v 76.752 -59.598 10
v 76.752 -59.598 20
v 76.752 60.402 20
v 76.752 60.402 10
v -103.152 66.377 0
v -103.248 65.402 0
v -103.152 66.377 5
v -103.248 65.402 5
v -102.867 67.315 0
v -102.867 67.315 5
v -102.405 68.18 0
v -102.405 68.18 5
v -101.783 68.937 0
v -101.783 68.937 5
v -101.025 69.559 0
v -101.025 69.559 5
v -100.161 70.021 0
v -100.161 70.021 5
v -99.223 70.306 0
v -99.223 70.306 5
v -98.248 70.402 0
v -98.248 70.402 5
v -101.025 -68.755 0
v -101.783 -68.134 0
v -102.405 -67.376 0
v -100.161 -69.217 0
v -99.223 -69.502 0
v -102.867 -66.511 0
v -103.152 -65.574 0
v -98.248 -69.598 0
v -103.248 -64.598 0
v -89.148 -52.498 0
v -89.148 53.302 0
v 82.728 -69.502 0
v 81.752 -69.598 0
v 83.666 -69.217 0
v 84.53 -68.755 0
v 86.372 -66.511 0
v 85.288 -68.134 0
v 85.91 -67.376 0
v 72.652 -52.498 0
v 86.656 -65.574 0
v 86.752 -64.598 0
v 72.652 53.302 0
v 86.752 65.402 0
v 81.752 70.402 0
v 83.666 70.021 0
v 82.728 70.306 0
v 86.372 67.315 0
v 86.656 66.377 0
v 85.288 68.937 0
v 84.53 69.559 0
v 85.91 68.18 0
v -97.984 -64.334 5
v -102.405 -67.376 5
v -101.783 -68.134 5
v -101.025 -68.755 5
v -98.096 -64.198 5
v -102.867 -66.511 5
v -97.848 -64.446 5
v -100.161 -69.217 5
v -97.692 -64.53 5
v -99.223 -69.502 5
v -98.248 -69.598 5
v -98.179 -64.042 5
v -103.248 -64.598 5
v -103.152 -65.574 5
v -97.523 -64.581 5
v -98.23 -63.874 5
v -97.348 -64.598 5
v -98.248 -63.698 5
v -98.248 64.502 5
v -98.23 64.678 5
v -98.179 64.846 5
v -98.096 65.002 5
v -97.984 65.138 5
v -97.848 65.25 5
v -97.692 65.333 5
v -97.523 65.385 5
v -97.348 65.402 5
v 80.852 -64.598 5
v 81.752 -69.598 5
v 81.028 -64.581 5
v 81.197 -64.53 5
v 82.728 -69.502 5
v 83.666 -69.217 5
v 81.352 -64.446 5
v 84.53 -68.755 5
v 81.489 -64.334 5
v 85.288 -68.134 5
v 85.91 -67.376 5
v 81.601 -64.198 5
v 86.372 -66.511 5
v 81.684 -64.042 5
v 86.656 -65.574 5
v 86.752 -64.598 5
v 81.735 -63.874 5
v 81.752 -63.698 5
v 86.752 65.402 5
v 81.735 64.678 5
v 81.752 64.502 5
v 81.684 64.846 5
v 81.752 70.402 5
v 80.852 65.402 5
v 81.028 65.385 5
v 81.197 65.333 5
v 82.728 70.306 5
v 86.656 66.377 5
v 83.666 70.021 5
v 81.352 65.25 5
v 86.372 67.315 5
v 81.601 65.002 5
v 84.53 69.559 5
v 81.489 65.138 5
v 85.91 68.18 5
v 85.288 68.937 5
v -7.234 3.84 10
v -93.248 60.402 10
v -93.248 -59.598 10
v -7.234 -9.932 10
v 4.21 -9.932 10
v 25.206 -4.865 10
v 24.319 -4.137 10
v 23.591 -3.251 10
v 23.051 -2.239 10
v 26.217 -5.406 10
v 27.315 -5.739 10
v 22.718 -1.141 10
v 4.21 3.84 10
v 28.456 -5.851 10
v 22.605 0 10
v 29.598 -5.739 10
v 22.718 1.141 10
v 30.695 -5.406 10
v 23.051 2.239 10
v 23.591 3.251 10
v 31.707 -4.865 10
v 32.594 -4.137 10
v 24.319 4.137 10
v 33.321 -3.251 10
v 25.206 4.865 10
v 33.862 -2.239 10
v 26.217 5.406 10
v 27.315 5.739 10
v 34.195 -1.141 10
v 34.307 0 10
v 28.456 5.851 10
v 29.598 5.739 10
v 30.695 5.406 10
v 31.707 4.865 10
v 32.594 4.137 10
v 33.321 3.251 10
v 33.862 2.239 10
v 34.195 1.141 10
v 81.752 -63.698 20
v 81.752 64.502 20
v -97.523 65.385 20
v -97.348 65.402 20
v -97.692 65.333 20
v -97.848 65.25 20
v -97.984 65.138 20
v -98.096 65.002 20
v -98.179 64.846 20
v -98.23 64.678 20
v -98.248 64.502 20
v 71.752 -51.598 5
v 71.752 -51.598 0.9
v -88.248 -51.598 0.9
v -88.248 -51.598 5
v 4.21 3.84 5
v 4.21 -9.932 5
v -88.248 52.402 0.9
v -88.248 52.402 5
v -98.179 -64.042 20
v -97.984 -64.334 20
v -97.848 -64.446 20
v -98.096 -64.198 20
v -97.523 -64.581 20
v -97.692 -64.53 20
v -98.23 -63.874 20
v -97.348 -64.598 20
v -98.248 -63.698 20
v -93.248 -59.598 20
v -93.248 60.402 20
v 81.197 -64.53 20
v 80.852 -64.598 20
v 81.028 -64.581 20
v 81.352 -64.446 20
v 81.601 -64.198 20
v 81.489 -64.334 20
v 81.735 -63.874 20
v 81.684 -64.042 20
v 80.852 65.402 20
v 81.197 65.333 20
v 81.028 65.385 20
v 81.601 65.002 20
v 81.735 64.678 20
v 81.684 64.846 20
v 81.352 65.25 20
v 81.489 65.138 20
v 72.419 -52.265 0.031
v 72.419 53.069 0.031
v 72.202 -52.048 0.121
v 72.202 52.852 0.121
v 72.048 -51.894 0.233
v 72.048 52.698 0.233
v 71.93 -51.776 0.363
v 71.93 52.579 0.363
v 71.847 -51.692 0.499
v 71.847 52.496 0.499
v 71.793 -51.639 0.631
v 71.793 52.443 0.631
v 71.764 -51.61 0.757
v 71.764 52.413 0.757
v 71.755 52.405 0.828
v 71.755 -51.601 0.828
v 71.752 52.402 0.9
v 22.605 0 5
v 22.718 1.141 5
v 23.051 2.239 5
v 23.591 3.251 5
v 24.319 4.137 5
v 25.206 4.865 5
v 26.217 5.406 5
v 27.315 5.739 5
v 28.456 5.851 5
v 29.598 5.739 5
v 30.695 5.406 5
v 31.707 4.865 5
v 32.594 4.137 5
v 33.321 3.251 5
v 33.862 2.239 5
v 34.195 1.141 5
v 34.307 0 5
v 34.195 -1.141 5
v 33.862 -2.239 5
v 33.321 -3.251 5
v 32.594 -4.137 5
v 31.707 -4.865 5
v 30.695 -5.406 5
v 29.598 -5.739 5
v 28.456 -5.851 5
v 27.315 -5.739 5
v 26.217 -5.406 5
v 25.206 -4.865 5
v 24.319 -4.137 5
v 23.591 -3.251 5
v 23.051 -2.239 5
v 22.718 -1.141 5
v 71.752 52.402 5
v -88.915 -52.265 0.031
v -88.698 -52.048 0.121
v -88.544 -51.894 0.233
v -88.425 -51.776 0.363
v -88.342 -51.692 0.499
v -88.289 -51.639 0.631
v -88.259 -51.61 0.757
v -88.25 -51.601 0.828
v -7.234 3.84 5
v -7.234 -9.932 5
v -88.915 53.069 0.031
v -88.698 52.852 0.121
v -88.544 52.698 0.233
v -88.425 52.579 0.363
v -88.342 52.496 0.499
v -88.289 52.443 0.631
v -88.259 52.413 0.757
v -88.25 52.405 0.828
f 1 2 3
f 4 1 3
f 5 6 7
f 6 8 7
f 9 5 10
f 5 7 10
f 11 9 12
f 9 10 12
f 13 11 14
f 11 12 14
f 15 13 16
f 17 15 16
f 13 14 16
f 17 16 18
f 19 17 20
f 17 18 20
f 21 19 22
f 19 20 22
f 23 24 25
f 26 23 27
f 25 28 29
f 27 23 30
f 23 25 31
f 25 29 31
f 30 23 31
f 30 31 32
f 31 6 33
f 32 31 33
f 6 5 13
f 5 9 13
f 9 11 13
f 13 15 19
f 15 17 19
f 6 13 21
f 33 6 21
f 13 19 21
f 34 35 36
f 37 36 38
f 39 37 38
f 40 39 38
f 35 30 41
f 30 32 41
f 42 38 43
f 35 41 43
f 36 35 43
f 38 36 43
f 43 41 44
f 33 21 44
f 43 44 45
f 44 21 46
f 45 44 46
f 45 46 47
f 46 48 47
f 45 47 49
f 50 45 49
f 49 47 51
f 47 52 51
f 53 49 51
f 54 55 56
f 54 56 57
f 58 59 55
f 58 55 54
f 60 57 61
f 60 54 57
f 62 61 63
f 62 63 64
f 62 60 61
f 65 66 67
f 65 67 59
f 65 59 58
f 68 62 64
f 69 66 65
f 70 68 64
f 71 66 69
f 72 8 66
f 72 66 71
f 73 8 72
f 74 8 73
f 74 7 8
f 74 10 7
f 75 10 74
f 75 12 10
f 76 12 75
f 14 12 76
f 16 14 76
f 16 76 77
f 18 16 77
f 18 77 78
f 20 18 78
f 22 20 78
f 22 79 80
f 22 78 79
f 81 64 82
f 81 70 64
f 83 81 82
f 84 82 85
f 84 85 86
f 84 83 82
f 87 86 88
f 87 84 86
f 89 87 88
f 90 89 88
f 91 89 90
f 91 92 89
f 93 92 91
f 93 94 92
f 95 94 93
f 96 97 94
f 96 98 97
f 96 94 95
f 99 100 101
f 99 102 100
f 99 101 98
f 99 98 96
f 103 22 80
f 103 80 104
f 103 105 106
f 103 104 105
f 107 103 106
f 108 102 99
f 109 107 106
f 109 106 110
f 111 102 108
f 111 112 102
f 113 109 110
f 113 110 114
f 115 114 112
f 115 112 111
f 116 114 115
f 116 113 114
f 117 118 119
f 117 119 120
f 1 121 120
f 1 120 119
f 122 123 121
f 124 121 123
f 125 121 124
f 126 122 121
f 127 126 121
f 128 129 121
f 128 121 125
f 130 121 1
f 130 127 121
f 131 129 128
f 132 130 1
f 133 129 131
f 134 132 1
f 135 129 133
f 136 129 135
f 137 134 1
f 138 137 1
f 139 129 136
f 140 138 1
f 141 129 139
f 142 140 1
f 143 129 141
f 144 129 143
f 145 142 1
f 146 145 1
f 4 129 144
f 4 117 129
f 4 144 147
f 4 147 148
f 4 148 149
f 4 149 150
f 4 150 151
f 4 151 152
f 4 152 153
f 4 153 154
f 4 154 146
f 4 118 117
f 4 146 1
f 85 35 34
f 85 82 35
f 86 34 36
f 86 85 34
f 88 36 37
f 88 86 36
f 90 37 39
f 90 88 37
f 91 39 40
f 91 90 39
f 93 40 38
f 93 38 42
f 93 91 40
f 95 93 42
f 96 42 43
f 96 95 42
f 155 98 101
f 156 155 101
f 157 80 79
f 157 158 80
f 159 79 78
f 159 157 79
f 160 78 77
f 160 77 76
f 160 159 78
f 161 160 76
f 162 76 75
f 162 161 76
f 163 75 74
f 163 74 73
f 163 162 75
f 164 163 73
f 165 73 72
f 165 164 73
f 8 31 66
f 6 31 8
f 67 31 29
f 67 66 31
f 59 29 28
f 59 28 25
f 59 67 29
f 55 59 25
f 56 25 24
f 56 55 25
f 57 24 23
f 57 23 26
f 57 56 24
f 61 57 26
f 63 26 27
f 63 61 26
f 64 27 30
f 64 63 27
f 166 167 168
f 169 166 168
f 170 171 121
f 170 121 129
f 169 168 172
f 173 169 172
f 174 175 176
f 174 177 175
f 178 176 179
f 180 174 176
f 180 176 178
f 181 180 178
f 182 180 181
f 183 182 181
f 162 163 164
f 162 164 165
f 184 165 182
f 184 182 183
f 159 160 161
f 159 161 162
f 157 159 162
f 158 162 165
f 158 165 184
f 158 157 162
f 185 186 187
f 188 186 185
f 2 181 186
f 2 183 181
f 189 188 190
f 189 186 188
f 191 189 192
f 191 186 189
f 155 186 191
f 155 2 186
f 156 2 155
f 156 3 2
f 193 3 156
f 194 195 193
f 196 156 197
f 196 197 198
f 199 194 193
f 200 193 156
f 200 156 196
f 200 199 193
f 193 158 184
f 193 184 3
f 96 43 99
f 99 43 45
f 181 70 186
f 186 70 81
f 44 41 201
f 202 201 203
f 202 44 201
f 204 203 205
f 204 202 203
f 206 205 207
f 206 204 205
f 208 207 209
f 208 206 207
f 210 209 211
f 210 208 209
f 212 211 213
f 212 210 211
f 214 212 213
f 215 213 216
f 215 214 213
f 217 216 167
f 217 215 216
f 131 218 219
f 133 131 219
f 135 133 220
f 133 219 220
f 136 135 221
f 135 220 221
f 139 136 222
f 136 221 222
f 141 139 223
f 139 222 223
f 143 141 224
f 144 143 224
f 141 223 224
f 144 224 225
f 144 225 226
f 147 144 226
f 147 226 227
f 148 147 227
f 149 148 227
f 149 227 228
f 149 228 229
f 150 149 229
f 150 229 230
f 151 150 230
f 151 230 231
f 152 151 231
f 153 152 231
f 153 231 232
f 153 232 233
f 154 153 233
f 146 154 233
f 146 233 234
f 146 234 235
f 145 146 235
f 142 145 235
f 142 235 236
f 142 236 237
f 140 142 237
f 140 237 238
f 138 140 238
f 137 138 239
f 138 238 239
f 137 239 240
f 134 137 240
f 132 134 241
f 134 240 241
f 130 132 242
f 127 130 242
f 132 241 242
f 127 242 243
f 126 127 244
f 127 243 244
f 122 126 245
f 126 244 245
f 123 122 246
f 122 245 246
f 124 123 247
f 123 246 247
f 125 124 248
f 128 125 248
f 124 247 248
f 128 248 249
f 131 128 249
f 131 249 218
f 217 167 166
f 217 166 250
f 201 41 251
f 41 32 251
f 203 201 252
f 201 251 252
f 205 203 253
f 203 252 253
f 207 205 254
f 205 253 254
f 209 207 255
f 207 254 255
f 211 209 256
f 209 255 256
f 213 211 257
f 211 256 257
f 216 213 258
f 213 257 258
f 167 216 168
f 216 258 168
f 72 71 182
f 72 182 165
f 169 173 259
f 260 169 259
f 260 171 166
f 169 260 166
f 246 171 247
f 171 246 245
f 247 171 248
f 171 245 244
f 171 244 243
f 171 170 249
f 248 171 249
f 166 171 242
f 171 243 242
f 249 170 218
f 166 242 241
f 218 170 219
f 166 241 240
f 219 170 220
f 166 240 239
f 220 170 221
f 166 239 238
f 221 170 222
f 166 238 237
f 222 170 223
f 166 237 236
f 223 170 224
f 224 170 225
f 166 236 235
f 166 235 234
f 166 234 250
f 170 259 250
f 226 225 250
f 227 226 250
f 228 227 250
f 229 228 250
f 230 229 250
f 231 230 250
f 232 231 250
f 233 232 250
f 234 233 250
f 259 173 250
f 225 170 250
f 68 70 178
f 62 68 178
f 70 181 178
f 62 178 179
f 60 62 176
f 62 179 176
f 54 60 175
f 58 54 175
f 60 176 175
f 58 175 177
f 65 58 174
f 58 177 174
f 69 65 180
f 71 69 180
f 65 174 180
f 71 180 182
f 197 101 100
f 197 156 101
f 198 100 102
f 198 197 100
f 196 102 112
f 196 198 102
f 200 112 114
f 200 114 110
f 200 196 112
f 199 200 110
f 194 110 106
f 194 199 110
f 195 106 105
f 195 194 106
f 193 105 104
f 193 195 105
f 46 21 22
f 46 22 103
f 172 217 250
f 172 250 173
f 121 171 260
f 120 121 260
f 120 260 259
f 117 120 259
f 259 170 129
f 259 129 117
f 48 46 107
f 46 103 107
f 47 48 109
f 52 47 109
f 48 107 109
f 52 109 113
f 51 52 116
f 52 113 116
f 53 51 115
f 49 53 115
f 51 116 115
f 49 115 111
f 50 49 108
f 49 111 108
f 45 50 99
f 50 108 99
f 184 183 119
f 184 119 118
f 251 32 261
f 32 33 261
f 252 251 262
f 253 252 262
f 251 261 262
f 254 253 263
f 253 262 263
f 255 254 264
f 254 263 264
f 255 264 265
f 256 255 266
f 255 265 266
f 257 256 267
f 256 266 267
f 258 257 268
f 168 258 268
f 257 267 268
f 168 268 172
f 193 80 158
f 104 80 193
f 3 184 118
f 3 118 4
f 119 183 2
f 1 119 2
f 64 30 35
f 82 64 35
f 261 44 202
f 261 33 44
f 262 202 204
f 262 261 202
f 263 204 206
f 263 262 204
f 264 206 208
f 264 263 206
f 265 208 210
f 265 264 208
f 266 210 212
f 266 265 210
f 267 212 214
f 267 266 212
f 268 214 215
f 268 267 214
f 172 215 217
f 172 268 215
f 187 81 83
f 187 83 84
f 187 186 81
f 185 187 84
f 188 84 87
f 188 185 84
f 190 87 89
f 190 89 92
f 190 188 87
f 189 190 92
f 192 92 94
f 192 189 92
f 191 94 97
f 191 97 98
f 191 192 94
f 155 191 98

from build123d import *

# Parameters (mm, degrees)
SKETCH1_W           = 190
SKETCH1_H           = 140
BOSS_EXTRUDE1_DEPTH = 5
SKETCH2_W           = 160
SKETCH2_H           = 104
CUT_EXTRUDE1_DEPTH  = 5
SKETCH3_W           = 180
SKETCH3_H           = 130
BOSS_EXTRUDE2_DEPTH = 15
SKETCH4_W           = 170
SKETCH4_H           = 120
CUT_EXTRUDE2_DEPTH  = 10
FILLET1_R           = 0.9
FILLET2_R           = 0.9
SKETCH5_R           = 5.850988458
SKETCH5_W           = 11.444331631
SKETCH5_H           = 13.771992302
CUT_EXTRUDE3_DEPTH  = 10
FILLET3_R           = 5


with BuildPart() as part:
    # Sketch1 → Boss-Extrude1 (new body)
    with BuildSketch(Plane.XY):
        with Locations((-8.247588424, 0.40192926)):
            Rectangle(SKETCH1_W, SKETCH1_H)
    extrude(amount=BOSS_EXTRUDE1_DEPTH)

    # Sketch2 → Cut-Extrude1 (cut)
    with BuildSketch(Plane(origin=(0, 0, 0), x_dir=(-1, 0, 0), z_dir=(0, 0, -1))):
        with Locations((8.247588424, 0.40192926)):
            Rectangle(SKETCH2_W, SKETCH2_H)
    extrude(amount=-CUT_EXTRUDE1_DEPTH, mode=Mode.SUBTRACT)

    # Sketch3 → Boss-Extrude2 (add)
    with BuildSketch(Plane.XY.offset(5)):
        with Locations((-8.247588424, 0.40192926)):
            Rectangle(SKETCH3_W, SKETCH3_H)
    extrude(amount=BOSS_EXTRUDE2_DEPTH)

    # Sketch4 → Cut-Extrude2 (cut)
    with BuildSketch(Plane.XY.offset(20)):
        with Locations((-8.247588424, 0.40192926)):
            Rectangle(SKETCH4_W, SKETCH4_H)
    extrude(amount=-CUT_EXTRUDE2_DEPTH, mode=Mode.SUBTRACT)

    # Fillet1
    fillet1_edges = [part.edges().sort_by_distance(p)[0] for p in [
        (71.752411576, 0.40192926, 0),
        (-8.247588424, -51.59807074, 0),
        (-88.247588424, 0.40192926, 0),
        (-8.247588424, 52.40192926, 0),
    ]]
    fillet(fillet1_edges, radius=FILLET1_R)

    # Fillet2
    fillet2_edges = [part.edges().sort_by_distance(p)[0] for p in [
        (-98.247588424, 65.40192926, 12.5),
        (-98.247588424, -64.59807074, 12.5),
        (81.752411576, -64.59807074, 12.5),
        (81.752411576, 65.40192926, 12.5),
    ]]
    fillet(fillet2_edges, radius=FILLET2_R)

    # Sketch5 → Cut-Extrude3 (cut)
    with BuildSketch(Plane(origin=(0, 0, 5), x_dir=(-1, 0, 0), z_dir=(0, 0, -1))):
        with Locations((-28.456331926, 0)):
            Circle(SKETCH5_R)
        with Locations((1.51229921, -3.046296959)):
            Rectangle(SKETCH5_W, SKETCH5_H)
    extrude(amount=-CUT_EXTRUDE3_DEPTH, mode=Mode.SUBTRACT)

    # Fillet3
    fillet3_edges = [part.edges().sort_by_distance(p)[0] for p in [
        (-103.247588424, 70.40192926, 2.5),
        (86.752411576, 70.40192926, 2.5),
        (86.752411576, -69.59807074, 2.5),
        (-103.247588424, -69.59807074, 2.5),
    ]]
    fillet(fillet3_edges, radius=FILLET3_R)


solid = part.part
